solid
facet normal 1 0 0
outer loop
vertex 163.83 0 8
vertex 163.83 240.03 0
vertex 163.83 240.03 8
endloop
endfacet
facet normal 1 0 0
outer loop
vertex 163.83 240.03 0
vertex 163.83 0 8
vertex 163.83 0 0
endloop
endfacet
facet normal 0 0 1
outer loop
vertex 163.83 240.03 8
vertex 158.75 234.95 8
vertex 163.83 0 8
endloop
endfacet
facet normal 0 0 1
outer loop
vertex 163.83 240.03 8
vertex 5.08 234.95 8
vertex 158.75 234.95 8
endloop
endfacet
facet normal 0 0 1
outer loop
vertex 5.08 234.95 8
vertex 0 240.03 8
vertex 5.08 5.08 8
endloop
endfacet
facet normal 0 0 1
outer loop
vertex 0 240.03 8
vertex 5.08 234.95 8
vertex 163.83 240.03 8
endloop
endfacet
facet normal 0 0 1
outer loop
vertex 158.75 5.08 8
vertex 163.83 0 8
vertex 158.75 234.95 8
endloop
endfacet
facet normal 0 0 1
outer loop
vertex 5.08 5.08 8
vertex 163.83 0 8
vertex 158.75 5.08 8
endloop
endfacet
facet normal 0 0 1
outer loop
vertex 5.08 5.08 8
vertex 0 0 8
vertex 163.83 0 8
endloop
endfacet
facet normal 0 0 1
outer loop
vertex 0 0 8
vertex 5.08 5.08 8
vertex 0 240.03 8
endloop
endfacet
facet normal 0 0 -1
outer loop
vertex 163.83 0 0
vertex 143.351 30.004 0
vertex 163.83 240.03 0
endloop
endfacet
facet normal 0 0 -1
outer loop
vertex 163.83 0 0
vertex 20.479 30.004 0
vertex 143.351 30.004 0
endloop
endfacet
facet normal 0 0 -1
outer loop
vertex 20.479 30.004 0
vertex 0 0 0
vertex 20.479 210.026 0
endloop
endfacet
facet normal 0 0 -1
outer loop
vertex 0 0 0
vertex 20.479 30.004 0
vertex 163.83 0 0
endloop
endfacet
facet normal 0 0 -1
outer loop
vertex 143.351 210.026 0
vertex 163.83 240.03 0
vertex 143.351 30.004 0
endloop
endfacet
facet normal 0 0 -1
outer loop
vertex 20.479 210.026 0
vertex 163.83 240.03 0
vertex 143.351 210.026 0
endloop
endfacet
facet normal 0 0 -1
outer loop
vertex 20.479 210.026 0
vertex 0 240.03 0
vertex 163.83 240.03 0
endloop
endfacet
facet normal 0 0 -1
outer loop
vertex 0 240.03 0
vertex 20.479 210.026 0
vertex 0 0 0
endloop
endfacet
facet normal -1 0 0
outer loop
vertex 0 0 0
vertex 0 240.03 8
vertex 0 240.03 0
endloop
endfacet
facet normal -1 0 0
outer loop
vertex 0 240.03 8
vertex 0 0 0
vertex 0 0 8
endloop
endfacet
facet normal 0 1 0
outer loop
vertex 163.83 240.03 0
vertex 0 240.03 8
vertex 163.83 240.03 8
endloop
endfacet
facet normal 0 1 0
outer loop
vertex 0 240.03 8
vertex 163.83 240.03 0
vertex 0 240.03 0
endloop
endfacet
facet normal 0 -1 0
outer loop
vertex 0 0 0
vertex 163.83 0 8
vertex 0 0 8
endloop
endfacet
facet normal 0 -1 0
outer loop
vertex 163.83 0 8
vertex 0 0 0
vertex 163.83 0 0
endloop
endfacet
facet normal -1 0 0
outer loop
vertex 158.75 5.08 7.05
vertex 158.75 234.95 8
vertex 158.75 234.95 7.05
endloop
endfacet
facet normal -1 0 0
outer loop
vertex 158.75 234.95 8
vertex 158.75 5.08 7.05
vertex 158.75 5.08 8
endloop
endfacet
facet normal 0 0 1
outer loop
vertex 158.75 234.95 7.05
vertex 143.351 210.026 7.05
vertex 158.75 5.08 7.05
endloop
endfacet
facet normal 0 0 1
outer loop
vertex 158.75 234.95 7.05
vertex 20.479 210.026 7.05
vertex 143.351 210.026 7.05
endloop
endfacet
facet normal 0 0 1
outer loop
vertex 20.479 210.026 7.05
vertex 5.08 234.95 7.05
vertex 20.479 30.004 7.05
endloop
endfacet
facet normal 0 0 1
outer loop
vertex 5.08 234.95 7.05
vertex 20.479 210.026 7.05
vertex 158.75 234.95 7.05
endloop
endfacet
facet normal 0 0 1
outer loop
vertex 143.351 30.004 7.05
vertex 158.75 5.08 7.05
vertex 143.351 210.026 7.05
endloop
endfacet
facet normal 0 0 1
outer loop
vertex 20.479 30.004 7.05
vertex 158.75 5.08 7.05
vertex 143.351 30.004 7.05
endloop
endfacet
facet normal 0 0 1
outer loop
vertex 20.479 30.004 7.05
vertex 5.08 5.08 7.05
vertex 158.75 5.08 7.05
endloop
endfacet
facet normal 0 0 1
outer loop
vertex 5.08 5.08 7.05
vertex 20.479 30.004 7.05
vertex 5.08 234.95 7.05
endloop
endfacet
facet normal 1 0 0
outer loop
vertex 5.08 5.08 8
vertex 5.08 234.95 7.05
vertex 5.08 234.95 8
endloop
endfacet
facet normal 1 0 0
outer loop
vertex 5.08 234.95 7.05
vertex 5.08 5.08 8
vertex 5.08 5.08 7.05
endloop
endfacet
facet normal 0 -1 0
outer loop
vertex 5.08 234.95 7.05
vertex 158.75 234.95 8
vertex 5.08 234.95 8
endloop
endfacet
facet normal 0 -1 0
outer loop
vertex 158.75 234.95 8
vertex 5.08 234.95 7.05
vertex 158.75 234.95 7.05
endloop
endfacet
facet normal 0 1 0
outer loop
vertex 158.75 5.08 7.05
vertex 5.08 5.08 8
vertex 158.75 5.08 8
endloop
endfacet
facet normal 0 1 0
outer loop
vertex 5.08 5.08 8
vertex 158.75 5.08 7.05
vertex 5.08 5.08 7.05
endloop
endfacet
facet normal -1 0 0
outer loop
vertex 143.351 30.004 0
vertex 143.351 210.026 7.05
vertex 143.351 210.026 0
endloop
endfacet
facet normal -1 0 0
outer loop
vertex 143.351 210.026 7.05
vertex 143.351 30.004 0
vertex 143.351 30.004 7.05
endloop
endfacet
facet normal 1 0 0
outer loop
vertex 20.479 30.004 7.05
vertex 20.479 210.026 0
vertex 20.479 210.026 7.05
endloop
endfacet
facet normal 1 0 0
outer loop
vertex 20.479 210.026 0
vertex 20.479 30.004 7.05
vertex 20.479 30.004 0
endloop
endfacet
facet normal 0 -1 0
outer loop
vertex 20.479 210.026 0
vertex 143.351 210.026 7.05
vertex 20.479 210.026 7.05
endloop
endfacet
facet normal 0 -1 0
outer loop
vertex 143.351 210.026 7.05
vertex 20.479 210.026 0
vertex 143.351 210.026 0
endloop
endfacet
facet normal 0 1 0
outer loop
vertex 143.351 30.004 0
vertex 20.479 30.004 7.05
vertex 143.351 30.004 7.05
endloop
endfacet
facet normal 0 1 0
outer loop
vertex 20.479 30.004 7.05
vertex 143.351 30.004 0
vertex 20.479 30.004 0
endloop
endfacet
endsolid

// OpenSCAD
inch = 25.4;

picture_x = 6.05 * inch;
picture_y = 9.05 * inch;
picture_z = .95;

wall_thickness = .2 * inch;

frame_x = picture_x + (wall_thickness * 2);
frame_y = picture_y + (wall_thickness * 2);
frame_z = 8;

difference() {
    cube([frame_x, frame_y, frame_z]);
    translate([wall_thickness, wall_thickness, (frame_z - picture_z)]) {
        cube([picture_x, picture_y, picture_z]);
    }
    
    translate([(frame_x *.125), (frame_y * .125), 0]) {
        cube([(frame_x *.75), (frame_y * .75), frame_z]);
    }
}     
